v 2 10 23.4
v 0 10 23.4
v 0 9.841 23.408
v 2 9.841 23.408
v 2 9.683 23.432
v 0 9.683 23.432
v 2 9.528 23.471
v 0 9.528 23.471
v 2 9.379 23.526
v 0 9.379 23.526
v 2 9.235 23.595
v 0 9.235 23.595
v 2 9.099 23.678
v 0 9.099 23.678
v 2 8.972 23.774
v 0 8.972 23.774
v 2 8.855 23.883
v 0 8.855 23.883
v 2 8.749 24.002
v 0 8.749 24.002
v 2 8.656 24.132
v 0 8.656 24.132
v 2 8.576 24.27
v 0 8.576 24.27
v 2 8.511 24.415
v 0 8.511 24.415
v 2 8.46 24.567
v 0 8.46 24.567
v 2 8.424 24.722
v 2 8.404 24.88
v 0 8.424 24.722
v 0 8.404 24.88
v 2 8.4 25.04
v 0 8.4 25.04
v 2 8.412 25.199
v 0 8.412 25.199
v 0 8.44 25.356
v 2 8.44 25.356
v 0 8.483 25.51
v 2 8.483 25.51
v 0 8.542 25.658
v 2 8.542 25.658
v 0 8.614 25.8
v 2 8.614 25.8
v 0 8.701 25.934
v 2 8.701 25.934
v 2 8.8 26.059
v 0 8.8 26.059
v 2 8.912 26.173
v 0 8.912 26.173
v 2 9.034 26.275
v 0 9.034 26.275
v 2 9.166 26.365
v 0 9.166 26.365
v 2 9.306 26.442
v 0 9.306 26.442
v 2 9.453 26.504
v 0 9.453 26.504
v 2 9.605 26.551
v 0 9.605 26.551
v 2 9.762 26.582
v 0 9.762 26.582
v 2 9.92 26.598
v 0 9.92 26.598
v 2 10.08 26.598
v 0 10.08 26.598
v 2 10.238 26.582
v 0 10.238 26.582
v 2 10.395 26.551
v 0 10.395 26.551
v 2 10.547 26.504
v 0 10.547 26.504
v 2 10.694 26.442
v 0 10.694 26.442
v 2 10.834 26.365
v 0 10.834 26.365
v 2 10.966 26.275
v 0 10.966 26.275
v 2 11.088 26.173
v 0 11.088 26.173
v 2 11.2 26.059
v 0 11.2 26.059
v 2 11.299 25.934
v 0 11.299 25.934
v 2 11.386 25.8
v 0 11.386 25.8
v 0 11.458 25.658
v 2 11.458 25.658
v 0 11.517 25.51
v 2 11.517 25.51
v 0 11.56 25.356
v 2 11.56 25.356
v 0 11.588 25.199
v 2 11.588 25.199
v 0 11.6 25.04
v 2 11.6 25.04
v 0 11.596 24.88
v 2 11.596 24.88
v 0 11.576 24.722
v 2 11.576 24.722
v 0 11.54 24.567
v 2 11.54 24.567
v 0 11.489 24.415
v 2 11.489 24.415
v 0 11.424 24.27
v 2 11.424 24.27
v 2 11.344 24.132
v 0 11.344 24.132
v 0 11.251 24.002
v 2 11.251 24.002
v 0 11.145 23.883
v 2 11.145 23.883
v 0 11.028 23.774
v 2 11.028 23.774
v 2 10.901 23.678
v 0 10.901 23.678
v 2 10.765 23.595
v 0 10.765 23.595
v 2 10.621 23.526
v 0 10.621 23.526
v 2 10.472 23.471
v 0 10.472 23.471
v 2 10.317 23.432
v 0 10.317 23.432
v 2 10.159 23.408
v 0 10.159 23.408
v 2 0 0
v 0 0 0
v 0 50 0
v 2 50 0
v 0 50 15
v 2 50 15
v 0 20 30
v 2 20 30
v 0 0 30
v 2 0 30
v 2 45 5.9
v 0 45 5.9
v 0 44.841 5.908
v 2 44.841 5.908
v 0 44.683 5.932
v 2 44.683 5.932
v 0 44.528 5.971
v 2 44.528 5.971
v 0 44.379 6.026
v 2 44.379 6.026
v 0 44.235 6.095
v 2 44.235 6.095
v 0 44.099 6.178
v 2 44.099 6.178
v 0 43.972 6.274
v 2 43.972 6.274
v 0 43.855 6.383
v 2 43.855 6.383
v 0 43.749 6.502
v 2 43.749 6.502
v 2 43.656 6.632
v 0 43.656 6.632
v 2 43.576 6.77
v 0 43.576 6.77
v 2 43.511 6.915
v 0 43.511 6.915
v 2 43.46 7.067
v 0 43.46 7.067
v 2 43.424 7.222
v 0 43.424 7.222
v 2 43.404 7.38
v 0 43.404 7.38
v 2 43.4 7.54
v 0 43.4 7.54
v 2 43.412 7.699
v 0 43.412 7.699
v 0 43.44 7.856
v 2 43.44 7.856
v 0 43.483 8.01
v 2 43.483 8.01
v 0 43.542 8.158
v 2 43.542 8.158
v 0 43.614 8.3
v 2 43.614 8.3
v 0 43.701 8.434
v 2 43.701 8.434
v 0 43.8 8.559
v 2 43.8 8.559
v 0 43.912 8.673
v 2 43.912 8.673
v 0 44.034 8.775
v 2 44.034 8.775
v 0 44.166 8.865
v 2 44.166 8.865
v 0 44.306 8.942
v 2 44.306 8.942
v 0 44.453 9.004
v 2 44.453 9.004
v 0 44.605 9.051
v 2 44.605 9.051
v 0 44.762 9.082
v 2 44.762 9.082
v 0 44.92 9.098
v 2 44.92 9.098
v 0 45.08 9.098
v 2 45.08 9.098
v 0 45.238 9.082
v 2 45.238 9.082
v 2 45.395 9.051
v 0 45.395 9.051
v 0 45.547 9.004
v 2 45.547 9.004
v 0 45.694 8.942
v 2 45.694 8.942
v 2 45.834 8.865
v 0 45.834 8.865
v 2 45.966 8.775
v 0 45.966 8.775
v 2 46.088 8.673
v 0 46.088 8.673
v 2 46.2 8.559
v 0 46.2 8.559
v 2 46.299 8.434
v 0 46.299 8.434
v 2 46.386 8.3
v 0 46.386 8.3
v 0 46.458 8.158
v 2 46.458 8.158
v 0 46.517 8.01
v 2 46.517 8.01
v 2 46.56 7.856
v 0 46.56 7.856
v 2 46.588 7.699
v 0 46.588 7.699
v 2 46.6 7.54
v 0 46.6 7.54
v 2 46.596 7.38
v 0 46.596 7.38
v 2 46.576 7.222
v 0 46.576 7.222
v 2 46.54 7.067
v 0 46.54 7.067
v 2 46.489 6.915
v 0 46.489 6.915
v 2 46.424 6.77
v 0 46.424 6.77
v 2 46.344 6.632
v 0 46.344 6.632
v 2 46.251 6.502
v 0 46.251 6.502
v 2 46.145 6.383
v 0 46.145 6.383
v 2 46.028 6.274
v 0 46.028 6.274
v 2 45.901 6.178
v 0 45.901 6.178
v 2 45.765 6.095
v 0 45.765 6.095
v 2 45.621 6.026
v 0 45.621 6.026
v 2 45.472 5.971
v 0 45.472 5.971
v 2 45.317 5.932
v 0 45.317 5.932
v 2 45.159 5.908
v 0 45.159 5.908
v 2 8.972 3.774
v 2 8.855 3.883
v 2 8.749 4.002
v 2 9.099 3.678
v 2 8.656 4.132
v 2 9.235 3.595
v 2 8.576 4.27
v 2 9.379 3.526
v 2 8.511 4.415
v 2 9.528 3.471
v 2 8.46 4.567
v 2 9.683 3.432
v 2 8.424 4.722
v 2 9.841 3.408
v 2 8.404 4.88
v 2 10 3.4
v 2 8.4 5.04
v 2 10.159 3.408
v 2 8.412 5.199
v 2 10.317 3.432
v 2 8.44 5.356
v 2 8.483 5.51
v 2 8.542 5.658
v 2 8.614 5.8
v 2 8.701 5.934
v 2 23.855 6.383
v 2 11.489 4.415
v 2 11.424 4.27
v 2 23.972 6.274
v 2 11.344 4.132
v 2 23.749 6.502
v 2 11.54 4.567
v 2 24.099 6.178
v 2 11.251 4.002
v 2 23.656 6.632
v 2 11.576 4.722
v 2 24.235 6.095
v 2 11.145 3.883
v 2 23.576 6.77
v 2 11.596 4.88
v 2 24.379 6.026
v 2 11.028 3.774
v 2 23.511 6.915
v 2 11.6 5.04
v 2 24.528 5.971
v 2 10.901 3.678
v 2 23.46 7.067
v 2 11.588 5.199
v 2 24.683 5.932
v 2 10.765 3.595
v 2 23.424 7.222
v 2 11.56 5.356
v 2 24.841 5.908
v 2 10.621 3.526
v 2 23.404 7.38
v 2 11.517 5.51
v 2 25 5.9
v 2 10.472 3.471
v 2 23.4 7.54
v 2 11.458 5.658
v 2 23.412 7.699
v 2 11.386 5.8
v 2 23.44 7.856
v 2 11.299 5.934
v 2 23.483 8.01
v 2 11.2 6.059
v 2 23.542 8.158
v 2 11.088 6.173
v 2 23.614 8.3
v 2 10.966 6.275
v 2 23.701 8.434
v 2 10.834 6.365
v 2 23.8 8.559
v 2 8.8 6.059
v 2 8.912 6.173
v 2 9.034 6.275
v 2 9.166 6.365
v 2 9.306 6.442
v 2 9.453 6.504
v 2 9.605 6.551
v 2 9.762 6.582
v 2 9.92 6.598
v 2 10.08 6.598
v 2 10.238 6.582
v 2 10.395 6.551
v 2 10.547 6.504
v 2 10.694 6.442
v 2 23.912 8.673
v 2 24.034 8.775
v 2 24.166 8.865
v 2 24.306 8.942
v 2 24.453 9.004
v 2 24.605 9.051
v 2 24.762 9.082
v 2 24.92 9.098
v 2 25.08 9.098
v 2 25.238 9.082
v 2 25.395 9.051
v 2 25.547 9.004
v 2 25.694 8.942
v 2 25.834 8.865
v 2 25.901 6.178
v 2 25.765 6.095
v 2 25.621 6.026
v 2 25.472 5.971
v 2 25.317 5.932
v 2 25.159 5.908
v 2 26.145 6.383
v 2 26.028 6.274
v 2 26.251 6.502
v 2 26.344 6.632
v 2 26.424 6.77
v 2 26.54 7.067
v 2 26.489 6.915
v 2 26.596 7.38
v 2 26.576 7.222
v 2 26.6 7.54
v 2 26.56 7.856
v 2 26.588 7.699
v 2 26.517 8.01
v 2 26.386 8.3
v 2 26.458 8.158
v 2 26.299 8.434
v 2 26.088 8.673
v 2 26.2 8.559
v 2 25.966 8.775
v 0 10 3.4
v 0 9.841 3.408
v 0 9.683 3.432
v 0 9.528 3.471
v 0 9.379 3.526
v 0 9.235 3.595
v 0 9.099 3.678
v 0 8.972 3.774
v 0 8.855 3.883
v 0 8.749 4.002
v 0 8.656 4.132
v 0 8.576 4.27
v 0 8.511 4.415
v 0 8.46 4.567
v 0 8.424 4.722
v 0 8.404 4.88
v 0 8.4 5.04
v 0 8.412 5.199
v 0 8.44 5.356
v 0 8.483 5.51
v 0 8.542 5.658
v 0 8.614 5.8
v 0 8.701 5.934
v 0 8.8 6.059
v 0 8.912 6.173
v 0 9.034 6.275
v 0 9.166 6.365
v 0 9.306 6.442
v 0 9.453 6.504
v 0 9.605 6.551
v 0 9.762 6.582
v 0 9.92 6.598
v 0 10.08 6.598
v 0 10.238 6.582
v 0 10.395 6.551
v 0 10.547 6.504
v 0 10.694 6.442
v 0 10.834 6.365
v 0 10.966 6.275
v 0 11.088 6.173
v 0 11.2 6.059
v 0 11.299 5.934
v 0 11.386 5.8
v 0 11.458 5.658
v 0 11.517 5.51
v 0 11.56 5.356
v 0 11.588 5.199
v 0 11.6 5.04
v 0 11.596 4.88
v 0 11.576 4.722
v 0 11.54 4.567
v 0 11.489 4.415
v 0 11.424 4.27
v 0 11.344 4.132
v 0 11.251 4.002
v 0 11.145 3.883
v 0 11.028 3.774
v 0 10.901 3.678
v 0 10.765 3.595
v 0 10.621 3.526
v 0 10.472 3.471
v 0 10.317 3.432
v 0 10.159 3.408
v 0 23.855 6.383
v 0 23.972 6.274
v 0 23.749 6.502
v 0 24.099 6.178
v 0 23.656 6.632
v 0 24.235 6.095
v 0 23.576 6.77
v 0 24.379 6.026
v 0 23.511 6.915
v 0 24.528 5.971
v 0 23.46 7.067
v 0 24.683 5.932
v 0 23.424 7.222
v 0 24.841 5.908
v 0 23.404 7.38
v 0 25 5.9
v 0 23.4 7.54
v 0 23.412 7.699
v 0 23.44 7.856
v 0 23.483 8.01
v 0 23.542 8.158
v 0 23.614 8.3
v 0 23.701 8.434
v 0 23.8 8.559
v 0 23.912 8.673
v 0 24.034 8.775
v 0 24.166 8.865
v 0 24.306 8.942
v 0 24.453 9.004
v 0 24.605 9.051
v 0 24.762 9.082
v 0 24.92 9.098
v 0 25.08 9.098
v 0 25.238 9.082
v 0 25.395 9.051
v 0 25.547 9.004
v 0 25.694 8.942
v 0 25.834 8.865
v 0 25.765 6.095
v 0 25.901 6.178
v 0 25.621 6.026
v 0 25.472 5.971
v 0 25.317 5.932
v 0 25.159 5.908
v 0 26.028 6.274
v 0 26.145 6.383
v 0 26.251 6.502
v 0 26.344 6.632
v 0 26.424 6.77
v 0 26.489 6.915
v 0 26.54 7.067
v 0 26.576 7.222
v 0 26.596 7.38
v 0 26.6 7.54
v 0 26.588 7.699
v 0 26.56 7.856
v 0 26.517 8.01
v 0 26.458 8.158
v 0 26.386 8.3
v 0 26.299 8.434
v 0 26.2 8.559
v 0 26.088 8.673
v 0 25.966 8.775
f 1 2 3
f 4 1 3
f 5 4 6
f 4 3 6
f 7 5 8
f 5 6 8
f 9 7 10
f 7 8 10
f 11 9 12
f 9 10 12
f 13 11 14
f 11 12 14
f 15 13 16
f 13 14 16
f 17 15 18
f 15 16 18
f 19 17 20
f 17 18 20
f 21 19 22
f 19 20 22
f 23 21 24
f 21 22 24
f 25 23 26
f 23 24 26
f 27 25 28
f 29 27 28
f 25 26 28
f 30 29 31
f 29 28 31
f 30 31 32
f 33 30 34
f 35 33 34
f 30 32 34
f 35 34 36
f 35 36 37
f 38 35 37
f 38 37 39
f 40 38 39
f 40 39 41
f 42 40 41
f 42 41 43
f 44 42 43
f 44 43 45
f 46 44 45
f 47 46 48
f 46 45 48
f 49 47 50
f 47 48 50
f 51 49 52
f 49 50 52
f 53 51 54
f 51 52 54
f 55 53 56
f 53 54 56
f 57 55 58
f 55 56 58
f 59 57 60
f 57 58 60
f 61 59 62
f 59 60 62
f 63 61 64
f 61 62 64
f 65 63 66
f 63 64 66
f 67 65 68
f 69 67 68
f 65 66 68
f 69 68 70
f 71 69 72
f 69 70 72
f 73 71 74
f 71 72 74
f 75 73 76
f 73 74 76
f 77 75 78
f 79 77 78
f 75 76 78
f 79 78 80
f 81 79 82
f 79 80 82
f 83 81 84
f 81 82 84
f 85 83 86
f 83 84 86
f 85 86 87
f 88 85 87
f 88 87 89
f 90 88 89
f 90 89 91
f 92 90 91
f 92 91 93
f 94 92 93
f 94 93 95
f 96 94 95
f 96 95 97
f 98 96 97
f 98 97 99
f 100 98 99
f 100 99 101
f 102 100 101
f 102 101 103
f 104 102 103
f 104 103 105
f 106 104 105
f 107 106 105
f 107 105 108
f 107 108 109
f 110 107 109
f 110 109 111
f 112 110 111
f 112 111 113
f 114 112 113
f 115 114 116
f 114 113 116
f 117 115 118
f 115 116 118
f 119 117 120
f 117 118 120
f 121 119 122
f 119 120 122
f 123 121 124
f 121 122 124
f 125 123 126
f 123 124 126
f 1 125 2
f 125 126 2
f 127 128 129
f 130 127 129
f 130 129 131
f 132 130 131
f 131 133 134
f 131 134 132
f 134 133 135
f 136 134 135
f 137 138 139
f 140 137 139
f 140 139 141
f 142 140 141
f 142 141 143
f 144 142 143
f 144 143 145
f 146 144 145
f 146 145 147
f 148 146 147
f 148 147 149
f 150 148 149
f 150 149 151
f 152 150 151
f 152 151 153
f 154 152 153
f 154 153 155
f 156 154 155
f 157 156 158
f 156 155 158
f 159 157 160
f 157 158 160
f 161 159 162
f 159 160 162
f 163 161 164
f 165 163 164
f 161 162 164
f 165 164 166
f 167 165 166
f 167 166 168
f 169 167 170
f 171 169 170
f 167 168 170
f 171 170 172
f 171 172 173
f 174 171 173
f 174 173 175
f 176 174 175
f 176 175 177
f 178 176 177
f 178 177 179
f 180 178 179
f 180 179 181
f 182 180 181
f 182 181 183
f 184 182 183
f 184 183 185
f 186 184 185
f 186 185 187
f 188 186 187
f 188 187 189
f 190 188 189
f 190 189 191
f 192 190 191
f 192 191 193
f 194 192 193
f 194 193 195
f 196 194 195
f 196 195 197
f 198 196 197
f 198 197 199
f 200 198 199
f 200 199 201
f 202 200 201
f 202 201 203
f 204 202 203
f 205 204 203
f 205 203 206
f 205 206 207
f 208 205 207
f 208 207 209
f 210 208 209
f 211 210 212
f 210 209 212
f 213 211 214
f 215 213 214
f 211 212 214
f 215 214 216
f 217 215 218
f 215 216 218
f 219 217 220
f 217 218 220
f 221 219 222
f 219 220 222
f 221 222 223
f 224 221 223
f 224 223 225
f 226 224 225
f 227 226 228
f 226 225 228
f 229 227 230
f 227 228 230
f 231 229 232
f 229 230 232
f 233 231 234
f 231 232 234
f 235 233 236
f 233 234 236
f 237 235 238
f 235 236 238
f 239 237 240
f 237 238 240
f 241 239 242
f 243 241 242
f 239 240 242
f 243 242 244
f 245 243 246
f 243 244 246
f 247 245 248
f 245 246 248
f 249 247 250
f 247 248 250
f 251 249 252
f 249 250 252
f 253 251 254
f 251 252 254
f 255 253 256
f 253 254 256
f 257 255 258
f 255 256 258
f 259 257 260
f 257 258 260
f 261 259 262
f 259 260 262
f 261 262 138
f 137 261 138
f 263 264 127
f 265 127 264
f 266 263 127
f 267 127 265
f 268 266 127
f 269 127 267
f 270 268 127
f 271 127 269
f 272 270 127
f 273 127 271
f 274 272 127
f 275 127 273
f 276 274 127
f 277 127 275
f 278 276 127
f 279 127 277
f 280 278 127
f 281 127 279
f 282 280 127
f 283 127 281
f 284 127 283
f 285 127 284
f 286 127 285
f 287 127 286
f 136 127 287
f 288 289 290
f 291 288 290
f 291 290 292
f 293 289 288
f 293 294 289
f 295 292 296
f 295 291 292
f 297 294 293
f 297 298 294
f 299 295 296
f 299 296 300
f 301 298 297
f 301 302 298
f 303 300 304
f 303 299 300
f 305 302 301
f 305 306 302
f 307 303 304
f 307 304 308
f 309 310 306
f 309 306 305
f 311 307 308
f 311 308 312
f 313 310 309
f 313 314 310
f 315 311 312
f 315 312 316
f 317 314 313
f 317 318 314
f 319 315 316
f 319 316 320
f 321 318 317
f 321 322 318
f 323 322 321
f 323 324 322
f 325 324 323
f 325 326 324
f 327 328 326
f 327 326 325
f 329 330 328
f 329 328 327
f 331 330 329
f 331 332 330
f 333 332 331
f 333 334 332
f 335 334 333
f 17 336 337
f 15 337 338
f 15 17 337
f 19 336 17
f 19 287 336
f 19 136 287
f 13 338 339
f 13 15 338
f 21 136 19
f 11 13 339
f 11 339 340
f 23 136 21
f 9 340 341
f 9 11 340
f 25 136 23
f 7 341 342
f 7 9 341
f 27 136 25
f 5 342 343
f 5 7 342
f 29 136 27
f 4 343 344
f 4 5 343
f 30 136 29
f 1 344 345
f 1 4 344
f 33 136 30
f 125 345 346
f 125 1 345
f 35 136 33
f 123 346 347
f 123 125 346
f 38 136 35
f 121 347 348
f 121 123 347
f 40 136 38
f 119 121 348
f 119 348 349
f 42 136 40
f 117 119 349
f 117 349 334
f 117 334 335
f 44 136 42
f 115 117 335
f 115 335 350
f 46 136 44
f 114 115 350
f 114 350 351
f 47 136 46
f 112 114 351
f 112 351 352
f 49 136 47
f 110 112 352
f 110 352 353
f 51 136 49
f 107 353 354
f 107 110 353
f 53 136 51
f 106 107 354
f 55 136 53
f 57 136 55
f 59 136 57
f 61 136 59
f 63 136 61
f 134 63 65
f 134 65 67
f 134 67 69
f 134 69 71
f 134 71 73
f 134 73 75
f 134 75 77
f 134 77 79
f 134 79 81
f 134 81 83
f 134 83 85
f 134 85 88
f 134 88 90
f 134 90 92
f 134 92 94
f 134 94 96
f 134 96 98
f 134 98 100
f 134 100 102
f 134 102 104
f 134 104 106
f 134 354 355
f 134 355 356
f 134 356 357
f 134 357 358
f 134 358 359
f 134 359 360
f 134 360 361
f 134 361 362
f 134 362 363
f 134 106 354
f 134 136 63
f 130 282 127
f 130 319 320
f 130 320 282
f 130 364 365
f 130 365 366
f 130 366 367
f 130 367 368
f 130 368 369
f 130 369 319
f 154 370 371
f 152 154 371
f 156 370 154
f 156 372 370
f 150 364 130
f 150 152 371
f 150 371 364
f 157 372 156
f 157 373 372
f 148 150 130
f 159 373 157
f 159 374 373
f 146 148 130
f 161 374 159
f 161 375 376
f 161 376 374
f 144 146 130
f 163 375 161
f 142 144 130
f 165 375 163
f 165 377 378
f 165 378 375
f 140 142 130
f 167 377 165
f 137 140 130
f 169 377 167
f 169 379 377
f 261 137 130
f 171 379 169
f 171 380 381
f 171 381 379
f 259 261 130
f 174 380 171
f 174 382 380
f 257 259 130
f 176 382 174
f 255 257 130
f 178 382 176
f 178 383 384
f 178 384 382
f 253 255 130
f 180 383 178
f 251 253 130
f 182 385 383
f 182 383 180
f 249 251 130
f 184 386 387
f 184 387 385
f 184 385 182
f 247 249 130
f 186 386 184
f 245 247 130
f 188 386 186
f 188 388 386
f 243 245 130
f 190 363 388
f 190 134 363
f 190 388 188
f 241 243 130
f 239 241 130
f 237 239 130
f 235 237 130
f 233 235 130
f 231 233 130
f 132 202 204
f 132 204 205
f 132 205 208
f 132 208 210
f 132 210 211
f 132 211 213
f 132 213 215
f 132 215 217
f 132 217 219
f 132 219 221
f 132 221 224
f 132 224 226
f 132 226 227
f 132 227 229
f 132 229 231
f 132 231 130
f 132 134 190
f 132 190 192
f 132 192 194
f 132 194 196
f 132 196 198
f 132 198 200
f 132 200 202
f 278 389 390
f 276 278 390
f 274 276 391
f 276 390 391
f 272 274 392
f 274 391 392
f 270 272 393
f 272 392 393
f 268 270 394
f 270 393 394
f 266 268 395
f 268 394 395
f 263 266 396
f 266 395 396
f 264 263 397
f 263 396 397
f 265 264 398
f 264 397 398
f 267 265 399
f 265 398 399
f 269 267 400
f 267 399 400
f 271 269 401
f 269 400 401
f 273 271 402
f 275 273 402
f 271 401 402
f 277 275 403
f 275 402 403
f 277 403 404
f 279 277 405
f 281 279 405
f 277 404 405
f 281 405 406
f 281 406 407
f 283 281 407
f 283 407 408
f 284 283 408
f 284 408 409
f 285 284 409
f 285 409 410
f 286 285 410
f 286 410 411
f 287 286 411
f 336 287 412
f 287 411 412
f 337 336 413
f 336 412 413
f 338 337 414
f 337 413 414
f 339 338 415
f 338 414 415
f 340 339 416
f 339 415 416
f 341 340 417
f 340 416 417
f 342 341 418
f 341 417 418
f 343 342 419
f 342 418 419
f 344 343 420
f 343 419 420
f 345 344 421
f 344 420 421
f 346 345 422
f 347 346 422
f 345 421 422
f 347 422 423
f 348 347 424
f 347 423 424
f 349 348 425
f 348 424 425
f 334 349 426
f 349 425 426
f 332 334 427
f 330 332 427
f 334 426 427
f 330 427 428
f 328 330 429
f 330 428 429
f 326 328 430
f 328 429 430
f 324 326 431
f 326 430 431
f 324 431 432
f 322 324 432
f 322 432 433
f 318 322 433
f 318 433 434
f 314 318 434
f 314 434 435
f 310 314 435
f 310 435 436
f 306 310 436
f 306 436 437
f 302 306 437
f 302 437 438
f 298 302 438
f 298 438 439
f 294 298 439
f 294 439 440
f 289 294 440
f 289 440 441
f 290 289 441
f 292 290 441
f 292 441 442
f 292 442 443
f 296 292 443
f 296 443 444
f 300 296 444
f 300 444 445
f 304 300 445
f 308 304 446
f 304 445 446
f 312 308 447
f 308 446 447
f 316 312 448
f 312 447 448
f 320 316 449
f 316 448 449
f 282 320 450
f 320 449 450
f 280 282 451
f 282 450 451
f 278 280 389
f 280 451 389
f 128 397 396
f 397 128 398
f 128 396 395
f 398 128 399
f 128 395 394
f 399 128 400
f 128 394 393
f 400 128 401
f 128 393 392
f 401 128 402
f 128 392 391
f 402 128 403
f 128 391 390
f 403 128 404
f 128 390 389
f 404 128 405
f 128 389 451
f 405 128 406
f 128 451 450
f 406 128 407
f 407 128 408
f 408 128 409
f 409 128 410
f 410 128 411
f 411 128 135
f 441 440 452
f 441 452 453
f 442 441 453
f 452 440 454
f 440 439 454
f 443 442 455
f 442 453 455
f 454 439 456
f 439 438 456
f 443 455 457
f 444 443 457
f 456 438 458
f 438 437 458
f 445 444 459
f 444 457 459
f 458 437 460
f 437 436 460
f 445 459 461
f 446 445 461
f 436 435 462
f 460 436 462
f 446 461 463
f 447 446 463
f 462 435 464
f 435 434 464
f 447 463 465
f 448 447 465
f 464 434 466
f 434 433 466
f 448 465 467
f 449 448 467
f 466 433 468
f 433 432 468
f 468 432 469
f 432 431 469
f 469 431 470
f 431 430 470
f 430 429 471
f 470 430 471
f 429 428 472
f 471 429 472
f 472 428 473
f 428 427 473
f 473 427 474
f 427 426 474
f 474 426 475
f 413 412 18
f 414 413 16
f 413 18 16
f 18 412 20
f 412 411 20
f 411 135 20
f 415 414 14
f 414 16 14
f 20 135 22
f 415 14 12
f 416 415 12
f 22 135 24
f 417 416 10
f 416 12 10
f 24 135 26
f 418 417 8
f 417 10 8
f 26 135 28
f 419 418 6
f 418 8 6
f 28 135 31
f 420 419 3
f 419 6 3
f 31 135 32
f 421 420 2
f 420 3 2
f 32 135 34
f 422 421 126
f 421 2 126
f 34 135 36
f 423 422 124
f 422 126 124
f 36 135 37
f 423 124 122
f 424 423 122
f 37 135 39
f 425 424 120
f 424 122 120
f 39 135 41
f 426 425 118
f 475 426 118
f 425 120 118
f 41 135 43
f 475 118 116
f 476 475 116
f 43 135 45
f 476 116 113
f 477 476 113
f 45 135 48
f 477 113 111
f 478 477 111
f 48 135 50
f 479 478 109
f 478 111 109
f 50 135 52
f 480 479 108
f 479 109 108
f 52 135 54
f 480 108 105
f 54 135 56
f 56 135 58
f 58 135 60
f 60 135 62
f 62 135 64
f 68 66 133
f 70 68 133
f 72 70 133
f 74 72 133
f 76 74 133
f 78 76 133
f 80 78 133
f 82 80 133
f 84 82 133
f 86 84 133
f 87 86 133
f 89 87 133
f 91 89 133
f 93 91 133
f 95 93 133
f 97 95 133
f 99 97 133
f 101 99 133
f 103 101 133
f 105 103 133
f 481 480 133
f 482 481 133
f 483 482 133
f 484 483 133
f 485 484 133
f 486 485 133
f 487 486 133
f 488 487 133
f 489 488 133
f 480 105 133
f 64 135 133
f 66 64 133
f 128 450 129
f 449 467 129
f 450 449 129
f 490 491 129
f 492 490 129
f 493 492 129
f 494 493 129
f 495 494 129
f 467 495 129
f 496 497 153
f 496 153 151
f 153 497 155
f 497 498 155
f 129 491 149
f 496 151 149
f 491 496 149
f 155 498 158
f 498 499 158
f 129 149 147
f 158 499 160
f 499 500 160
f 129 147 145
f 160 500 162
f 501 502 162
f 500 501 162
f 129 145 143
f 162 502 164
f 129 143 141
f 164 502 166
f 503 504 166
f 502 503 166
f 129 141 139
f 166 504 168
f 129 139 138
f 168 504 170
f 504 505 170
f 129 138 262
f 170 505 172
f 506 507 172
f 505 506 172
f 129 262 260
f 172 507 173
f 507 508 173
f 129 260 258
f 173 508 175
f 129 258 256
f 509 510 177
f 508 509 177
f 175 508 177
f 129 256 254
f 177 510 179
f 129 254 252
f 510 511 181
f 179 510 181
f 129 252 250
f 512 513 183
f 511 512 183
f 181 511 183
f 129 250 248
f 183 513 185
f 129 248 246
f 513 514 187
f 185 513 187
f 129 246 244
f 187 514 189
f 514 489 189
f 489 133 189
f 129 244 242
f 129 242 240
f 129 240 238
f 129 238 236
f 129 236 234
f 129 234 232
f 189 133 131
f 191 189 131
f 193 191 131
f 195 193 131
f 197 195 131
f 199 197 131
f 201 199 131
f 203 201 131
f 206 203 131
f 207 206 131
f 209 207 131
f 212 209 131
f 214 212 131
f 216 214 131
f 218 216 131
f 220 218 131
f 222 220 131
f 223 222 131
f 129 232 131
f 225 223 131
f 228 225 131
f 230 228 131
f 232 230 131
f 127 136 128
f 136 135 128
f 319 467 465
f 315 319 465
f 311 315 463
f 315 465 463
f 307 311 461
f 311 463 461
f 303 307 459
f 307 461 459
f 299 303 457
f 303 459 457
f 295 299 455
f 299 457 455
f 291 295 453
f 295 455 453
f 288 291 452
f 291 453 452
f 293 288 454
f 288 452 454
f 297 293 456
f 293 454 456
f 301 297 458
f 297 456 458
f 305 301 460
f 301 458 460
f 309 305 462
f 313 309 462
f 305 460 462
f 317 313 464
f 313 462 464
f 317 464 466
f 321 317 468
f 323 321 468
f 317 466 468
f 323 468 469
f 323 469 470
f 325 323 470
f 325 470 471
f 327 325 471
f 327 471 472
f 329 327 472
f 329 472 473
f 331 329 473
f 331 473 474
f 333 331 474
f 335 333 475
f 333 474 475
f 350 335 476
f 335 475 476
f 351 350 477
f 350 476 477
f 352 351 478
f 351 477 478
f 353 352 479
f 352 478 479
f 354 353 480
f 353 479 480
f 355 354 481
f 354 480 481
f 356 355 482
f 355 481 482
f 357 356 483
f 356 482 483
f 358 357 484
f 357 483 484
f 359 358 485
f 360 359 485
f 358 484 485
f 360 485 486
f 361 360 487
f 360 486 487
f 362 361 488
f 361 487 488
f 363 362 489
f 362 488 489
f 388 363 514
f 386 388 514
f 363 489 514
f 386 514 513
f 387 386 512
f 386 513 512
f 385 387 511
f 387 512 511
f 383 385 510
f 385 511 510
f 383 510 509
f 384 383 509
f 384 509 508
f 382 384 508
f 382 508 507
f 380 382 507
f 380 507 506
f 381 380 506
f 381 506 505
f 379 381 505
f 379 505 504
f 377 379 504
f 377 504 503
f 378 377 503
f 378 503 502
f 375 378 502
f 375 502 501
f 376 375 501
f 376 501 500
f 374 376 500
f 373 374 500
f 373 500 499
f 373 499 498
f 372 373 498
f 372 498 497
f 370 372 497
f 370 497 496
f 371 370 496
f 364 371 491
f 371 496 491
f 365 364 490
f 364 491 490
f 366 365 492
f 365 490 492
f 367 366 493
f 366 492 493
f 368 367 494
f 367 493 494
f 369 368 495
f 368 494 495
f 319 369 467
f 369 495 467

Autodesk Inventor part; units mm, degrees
ref_plane "YZ Plane" through (0, 0, 0) normal (1, 0, 0) x (0, 1, 0)
ref_plane "XZ Plane" through (0, 0, 0) normal (0, 1, 0) x (-1, 0, 0)
ref_plane "XY Plane" through (0, 0, 0) normal (0, 0, 1) x (1, 0, 0)
sketch "スケッチ1" plane through (0, 0, 0) normal (1, 0, 0) x (0, 1, 0)
  line L0 (0, 0) -> (50, 0)
  line L1 (50, 0) -> (50, 15)
  line L2 (50, 15) -> (0, 15) construction
  line L3 (0, 15) -> (0, 0)
  line L4 (0, 0) -> (20, 0)
  line L5 (20, 0) -> (20, 30) construction
  line L6 (20, 30) -> (0, 30)
  line L7 (0, 30) -> (0, 0)
  line L8 (20, 30) -> (50, 15)
  dimension "d0" = 15
  dimension "d1" = 20
  dimension "d2" = 30
  dimension "d3" = 30
extrude "押し出し1" add sketch "スケッチ1" along normal blind 2
sketch "スケッチ2" plane through (2, 0, 0) normal (1, 0, 0) x (0, 0, -1)
  line L0 (-30, 20) -> (-30, 0) projected
  line L1 (-30, 10) -> (0, 10) construction
  line L2 (0, 0) -> (0, 50) projected
  line L3 (0, 50) -> (-15, 50) projected
  line L4 (-7.5, 50) -> (-7.5, 0) construction
  line L5 (-30, 0) -> (0, 0) projected
  point P0 (-25, 10)
  point P1 (-5, 10)
  point P2 (-7.5, 25)
  point P3 (-7.5, 45)
  dimension "d6" = 20
  dimension "d7" = 5
  dimension "d8" = 20
  dimension "d9" = 5
hole "穴1" at (2, 10, 25) at (2, 10, 5) at (2, 25, 7.5) at (2, 45, 7.5) direction (-1, 0, 0) diameter 3.2 end through all
properties part number "FrameJoint2015" material "アルミニウム 6061"
